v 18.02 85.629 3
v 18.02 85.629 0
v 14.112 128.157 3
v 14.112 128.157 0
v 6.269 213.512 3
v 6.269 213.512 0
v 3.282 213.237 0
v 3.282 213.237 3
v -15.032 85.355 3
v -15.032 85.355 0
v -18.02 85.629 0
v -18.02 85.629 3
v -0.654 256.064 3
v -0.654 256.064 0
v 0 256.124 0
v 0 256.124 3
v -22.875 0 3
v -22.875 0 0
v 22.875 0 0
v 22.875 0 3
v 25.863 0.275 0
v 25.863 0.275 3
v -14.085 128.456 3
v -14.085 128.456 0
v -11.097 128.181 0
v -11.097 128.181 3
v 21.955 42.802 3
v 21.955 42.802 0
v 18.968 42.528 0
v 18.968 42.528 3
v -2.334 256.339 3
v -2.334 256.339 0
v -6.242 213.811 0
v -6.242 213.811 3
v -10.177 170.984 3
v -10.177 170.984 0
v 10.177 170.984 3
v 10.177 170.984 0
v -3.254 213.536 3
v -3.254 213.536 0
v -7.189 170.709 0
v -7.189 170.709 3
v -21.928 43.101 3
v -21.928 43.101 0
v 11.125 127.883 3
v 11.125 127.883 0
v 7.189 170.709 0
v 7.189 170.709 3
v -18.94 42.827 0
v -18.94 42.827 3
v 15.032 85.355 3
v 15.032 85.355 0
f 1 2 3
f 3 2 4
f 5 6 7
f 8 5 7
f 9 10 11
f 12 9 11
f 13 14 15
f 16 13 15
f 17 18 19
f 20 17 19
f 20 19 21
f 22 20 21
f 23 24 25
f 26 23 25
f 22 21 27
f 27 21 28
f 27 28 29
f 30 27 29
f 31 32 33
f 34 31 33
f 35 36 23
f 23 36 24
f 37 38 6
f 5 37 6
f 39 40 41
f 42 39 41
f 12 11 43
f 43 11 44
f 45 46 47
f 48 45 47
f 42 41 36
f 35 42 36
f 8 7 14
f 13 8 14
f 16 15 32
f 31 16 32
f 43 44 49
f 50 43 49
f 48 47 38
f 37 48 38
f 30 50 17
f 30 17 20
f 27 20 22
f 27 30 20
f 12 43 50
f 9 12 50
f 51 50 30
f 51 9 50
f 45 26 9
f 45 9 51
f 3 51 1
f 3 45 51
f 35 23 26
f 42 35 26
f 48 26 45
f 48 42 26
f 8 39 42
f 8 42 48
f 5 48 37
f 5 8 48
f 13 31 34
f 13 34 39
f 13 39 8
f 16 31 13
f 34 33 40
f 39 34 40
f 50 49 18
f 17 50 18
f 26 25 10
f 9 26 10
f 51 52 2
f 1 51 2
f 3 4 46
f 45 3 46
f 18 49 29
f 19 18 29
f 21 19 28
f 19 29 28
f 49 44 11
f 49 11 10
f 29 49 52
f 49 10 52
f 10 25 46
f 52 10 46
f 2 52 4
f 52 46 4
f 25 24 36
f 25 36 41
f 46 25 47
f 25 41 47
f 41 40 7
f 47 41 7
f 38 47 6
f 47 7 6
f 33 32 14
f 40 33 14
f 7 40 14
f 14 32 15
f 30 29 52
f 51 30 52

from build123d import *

# Parameters (mm, degrees)
BOSS_EXTRUDE1_DEPTH = 3


with BuildPart() as part:
    # Sketch1 → Boss-Extrude1 (new body)
    with BuildSketch(Plane.XY):
        Polygon((-0.65358299, 256.064124233), (0, 256.124180074), (-2.333831792, 256.338629089), (-6.241604492, 213.81064579), (-3.254189709, 213.536140934), (-7.189412895, 170.709416156), (-10.176827678, 170.983921012), (-14.084600378, 128.455937712), (-11.097185595, 128.181432856), (-15.03240878, 85.354708078), (-18.019823563, 85.629212934), (-21.927596263, 43.101229634), (-18.94018148, 42.826724778), (-22.875404666, 0), (22.875404666, 0), (25.862819449, 0.274504856), (21.955046749, 42.802488156), (18.967631966, 42.5279833), (15.03240878, 85.354708078), (18.019823563, 85.629212934), (14.112050863, 128.157196234), (11.12463608, 127.882691378), (7.189412895, 170.709416156), (10.176827678, 170.983921012), (6.269054978, 213.511904311), (3.281640195, 213.237399455), align=None)
    extrude(amount=BOSS_EXTRUDE1_DEPTH)


solid = part.part
